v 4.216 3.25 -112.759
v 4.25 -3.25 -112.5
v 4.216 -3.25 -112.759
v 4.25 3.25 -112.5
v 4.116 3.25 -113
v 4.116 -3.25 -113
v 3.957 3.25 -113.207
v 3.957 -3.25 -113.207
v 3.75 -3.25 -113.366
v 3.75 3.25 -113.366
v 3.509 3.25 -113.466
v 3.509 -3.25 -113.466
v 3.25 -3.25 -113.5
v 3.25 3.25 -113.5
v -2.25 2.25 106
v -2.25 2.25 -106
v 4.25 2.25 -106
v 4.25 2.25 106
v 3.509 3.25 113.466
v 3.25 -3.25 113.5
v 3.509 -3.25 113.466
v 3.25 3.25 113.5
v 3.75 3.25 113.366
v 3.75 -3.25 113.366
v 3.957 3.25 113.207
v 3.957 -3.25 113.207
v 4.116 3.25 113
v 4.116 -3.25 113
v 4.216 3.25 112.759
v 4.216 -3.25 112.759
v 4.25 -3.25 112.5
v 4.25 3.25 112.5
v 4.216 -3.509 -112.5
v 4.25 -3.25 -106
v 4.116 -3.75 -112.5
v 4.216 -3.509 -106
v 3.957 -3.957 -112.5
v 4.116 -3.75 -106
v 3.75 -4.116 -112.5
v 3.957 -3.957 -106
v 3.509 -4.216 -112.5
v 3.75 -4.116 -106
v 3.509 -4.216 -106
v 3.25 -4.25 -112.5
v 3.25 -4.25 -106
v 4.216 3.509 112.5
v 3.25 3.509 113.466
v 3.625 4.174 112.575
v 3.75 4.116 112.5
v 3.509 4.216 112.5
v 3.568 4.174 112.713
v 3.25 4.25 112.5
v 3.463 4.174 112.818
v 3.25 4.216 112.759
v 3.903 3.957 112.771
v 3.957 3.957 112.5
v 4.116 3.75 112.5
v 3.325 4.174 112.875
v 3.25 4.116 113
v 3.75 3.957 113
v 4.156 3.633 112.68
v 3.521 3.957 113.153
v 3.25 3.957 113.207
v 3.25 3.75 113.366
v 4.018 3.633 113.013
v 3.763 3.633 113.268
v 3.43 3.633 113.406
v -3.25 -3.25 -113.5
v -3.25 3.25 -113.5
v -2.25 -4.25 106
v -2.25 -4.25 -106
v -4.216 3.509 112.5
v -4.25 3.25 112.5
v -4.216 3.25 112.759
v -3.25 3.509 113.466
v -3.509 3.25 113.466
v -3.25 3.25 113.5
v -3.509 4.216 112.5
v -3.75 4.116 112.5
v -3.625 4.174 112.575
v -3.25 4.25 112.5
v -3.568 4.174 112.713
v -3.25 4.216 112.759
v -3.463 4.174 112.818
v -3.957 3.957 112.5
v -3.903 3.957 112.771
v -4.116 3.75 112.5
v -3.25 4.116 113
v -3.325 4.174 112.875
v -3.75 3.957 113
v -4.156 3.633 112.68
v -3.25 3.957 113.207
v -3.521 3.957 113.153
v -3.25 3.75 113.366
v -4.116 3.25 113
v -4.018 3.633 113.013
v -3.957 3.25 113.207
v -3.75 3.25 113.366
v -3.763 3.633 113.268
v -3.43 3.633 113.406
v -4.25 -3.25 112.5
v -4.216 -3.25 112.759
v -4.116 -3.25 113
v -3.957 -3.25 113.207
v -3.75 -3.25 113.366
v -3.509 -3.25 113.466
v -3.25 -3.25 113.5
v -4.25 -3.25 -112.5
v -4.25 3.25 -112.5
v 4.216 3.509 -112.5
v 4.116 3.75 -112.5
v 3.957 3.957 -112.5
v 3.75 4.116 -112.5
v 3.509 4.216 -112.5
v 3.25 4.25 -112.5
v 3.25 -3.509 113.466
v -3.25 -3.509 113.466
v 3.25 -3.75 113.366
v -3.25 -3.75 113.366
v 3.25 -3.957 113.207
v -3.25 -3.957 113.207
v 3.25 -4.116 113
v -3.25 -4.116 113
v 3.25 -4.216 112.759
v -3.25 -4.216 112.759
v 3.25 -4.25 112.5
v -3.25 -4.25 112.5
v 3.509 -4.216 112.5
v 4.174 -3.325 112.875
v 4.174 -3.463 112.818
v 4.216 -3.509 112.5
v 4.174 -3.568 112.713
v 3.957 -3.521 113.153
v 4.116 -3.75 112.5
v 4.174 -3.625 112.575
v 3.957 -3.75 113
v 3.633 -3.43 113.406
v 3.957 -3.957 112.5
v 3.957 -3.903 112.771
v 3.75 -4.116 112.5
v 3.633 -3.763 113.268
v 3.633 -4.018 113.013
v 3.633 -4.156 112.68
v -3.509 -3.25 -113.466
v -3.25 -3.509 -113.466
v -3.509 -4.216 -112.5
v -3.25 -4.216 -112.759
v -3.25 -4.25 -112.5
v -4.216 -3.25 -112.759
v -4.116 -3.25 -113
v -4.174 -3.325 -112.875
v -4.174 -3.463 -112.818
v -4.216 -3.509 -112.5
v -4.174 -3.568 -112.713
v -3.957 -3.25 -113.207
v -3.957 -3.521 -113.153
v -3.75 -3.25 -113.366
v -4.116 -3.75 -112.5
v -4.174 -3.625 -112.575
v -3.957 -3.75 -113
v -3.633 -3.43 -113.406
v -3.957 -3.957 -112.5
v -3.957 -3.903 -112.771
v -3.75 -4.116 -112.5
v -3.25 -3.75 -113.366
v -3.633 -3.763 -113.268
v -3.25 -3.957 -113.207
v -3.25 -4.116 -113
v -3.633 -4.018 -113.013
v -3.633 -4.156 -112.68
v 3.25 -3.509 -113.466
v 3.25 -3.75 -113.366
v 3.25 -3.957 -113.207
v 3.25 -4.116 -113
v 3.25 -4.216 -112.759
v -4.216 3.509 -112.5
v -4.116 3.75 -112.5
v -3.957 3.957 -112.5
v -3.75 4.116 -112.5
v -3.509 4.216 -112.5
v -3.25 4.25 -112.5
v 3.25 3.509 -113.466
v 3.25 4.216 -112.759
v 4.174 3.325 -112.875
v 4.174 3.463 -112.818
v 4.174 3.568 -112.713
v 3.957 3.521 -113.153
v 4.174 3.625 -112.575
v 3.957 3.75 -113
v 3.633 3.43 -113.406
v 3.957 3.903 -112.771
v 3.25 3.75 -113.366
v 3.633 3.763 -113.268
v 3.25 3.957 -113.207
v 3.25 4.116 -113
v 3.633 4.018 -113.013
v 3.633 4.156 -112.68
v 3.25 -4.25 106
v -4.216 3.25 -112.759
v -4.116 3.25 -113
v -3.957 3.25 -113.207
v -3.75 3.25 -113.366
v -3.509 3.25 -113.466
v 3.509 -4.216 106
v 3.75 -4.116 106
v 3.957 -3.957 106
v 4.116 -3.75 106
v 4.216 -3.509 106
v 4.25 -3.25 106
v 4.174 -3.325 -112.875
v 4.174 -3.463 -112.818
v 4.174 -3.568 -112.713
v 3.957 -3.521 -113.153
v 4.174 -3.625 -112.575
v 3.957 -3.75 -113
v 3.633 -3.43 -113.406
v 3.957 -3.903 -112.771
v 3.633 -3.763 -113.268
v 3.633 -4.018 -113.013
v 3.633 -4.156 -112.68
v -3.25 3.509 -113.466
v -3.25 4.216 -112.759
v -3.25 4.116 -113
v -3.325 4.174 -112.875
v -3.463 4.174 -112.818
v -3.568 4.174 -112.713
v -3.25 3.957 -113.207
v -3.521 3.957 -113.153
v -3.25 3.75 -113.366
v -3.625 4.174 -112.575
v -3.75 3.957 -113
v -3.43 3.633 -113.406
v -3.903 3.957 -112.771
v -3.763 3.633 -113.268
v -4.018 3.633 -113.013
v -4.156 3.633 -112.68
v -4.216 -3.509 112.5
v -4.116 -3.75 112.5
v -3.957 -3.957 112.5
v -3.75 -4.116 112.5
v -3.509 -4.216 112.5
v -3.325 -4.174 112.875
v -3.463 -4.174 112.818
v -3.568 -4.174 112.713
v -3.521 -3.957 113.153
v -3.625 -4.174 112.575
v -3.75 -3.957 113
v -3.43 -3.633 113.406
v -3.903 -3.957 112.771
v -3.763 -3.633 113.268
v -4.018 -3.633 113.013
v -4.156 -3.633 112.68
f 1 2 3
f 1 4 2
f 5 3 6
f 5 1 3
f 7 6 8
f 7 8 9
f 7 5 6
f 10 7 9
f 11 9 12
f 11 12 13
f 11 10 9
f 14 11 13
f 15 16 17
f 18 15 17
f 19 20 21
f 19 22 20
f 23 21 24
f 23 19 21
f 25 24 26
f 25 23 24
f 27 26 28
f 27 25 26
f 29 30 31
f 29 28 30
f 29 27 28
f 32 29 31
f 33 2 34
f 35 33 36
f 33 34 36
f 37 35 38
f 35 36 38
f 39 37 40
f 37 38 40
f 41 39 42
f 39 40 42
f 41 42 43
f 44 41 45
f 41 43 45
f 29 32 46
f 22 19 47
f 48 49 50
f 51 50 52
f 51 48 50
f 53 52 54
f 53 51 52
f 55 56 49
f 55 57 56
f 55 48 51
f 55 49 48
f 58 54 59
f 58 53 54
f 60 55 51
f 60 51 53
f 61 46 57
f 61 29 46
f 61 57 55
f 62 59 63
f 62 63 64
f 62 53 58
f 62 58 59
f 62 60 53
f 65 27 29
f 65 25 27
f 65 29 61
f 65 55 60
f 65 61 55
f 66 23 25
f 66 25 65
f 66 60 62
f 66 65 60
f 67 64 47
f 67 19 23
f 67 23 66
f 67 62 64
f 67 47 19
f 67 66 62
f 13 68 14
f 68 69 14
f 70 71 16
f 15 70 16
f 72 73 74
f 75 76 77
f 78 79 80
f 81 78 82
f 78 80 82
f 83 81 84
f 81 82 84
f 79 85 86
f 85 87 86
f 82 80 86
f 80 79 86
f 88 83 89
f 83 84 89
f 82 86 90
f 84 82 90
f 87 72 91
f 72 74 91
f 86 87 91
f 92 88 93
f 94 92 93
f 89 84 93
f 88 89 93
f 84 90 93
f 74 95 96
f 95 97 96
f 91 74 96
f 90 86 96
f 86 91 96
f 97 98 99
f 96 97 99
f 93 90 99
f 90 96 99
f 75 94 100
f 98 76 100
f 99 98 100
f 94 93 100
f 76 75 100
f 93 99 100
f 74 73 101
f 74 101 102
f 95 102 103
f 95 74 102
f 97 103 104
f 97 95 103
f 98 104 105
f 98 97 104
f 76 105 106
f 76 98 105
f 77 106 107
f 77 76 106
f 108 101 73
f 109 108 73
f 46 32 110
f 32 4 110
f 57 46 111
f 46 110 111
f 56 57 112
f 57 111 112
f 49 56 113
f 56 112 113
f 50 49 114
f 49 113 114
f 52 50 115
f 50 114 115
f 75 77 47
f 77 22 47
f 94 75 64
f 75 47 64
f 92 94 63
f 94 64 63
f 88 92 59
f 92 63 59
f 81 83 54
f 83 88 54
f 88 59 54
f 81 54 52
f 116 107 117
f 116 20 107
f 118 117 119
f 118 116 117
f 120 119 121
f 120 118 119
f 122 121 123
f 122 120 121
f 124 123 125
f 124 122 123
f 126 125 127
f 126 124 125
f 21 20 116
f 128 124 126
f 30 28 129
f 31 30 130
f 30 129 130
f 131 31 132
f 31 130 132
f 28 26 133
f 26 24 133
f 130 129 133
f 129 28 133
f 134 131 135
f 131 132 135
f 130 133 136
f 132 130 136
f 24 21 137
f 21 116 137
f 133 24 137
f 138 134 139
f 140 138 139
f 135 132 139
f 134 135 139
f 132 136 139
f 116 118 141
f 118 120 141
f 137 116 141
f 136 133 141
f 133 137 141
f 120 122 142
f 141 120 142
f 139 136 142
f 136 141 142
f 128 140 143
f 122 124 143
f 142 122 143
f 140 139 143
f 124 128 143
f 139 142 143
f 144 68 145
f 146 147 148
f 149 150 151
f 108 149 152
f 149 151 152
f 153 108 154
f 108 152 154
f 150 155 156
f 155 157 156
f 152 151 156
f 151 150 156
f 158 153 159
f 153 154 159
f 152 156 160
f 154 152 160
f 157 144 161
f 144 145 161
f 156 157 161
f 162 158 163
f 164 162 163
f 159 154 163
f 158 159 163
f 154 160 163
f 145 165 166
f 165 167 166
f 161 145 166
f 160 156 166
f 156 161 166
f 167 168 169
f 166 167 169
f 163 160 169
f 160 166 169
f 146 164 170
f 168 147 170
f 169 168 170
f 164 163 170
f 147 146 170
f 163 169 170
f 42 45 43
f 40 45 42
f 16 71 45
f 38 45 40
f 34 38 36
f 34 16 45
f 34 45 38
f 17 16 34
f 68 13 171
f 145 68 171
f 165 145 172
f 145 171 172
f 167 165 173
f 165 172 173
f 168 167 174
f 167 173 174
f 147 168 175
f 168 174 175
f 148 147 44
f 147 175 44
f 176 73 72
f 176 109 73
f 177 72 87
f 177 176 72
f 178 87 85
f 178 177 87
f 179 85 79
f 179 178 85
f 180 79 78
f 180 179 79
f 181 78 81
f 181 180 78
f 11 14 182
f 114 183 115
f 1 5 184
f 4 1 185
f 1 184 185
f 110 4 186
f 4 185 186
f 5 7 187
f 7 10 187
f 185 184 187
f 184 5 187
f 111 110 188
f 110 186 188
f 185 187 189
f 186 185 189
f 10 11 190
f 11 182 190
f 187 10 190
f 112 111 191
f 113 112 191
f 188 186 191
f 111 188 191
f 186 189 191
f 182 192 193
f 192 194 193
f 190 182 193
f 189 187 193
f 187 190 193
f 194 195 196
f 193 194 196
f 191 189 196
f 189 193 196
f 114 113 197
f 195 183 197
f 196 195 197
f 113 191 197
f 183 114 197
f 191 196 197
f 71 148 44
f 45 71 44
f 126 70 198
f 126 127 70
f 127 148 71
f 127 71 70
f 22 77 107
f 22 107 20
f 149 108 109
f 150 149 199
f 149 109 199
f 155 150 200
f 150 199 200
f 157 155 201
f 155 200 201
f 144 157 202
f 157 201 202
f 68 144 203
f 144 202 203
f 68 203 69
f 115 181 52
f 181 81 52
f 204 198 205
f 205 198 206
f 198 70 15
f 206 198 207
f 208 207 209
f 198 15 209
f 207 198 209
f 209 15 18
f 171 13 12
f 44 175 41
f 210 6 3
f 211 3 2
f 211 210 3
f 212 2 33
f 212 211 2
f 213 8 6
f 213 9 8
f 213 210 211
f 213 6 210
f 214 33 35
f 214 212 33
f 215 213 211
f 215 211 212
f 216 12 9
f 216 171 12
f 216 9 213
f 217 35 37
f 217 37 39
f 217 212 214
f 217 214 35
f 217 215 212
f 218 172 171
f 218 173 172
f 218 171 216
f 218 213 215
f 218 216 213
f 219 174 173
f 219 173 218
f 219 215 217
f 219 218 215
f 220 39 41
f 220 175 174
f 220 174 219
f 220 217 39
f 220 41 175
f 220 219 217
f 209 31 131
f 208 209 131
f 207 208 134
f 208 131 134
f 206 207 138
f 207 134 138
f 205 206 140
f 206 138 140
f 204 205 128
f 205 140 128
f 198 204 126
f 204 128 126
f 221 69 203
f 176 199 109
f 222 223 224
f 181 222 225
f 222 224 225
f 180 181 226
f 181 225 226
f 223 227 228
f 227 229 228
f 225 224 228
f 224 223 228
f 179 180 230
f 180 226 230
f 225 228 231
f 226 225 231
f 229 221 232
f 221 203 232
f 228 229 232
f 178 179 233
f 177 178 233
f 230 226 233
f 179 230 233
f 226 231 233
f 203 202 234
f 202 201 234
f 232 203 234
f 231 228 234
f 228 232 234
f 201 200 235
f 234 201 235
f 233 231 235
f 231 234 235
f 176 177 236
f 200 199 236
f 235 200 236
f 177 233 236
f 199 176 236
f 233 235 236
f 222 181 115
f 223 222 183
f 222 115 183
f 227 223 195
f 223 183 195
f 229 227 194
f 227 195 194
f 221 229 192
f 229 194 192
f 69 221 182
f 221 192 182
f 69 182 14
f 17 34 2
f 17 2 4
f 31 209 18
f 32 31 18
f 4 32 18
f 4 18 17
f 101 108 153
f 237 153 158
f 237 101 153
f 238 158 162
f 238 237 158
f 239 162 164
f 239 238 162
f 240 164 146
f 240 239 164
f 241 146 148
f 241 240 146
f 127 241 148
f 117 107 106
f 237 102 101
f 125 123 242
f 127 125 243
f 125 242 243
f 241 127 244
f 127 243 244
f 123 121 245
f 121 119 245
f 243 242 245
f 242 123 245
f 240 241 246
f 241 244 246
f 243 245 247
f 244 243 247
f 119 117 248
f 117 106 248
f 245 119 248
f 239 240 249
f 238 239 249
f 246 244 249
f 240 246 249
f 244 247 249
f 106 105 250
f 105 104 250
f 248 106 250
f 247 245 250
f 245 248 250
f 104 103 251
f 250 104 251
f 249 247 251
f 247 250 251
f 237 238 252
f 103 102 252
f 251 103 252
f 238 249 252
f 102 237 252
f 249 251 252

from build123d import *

# Parameters (mm, degrees)
SKETCH1_W               = 8.5
SKETCH1_H               = 8.5
BOSS_EXTRUDE1_DEPTH     = 113.5
FILLET2_R               = 1
CUT_EXTRUDE1_DEPTH      = 106
CUT_EXTRUDE1_DEPTH_BACK = 106
SKETCH2_W               = 6.5
SKETCH2_H               = 6.5


with BuildPart() as part:
    # Sketch1 → Boss-Extrude1 (new, symmetric)
    with BuildSketch(Plane.XY):
        Rectangle(SKETCH1_W, SKETCH1_H)
    extrude(amount=BOSS_EXTRUDE1_DEPTH, both=True)

    # Fillet2
    fillet2_edges = [part.edges().sort_by_distance(p)[0] for p in [
        (-4.25, 0, 113.5),
        (0, -4.25, 113.5),
        (4.25, 0, 113.5),
        (0, -4.25, -113.5),
        (-4.25, 0, -113.5),
        (0, 4.25, -113.5),
        (4.25, 0, -113.5),
        (4.25, -4.25, 0),
        (-4.25, -4.25, 0),
        (-4.25, 4.25, 0),
        (4.25, 4.25, 0),
        (0, 4.25, 113.5),
    ]]
    fillet(fillet2_edges, radius=FILLET2_R)

    # Sketch2 → Cut-Extrude1 (cut, two sides: drawn at the far end of the back side and taken through both)
    with BuildSketch(Plane.XY.offset(-CUT_EXTRUDE1_DEPTH_BACK)):
        with Locations((1, -1)):
            Rectangle(SKETCH2_W, SKETCH2_H)
    extrude(amount=CUT_EXTRUDE1_DEPTH + CUT_EXTRUDE1_DEPTH_BACK, mode=Mode.SUBTRACT)


solid = part.part
